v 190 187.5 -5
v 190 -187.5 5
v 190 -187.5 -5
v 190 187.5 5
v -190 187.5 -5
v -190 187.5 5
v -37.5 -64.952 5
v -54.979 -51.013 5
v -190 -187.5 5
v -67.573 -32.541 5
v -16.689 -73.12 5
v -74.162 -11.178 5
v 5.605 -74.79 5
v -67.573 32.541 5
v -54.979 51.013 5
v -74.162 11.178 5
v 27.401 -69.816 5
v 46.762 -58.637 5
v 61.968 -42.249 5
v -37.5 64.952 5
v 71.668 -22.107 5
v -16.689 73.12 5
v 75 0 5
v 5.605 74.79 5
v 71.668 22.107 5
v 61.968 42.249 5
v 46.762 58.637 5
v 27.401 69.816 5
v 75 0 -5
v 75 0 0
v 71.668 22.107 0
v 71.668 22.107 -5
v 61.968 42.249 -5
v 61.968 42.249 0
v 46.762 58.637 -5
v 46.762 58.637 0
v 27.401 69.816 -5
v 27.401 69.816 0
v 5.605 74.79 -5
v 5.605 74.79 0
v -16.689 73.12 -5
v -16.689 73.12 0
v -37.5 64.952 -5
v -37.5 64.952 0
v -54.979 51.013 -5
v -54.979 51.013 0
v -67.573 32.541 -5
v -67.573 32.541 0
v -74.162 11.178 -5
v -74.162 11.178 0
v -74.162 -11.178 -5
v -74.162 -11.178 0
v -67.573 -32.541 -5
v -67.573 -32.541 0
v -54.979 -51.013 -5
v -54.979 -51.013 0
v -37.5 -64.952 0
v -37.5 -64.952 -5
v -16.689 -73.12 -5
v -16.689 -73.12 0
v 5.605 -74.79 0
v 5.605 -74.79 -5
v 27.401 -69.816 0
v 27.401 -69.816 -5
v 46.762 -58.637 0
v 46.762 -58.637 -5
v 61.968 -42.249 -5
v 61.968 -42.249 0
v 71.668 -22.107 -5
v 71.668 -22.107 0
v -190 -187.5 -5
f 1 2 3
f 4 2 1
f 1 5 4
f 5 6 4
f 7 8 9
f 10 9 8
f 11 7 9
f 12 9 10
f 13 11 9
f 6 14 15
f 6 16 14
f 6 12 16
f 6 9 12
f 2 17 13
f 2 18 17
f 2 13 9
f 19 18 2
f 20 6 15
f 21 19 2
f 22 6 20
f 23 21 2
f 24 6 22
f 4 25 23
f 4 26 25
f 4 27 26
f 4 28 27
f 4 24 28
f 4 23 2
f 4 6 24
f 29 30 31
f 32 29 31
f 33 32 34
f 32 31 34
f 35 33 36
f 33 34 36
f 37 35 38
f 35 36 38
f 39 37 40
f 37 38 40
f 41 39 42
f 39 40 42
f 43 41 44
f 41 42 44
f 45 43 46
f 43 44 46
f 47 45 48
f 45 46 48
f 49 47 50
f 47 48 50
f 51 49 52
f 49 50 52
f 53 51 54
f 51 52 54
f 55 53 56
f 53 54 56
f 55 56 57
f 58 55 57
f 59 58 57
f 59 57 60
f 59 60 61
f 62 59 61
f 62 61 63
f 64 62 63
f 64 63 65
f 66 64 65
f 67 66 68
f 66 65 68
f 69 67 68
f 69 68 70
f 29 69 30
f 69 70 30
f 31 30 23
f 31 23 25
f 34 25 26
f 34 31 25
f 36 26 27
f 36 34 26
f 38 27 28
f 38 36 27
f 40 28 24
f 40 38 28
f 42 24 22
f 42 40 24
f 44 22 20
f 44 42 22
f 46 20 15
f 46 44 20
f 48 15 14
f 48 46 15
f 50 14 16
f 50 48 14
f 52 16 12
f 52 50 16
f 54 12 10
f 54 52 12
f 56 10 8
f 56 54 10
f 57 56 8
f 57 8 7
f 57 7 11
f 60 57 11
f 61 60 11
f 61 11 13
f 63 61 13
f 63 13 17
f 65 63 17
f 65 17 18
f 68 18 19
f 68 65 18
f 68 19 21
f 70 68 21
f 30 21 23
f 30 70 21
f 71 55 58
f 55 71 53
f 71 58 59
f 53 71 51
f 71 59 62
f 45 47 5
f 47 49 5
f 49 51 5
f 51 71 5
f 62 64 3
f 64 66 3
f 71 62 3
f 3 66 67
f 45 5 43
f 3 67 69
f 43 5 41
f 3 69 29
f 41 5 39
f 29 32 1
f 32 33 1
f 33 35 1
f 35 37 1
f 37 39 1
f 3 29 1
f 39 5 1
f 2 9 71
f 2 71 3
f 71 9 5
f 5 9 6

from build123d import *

# Parameters (mm, degrees)
F0_W          = 380
F0_H          = 375
F0_R          = 75
F1_DEPTH      = 5
F1_DEPTH_BACK = 5


with BuildPart() as f1:
    # F0 (on Top) → F1 (new body, two sides)
    with BuildSketch(Plane.XY) as f1_sk:
        Rectangle(F0_W, F0_H)
        Circle(F0_R, mode=Mode.SUBTRACT)
    extrude(amount=F1_DEPTH)
    extrude(f1_sk.sketch, amount=-F1_DEPTH_BACK)


solid = f1.part
